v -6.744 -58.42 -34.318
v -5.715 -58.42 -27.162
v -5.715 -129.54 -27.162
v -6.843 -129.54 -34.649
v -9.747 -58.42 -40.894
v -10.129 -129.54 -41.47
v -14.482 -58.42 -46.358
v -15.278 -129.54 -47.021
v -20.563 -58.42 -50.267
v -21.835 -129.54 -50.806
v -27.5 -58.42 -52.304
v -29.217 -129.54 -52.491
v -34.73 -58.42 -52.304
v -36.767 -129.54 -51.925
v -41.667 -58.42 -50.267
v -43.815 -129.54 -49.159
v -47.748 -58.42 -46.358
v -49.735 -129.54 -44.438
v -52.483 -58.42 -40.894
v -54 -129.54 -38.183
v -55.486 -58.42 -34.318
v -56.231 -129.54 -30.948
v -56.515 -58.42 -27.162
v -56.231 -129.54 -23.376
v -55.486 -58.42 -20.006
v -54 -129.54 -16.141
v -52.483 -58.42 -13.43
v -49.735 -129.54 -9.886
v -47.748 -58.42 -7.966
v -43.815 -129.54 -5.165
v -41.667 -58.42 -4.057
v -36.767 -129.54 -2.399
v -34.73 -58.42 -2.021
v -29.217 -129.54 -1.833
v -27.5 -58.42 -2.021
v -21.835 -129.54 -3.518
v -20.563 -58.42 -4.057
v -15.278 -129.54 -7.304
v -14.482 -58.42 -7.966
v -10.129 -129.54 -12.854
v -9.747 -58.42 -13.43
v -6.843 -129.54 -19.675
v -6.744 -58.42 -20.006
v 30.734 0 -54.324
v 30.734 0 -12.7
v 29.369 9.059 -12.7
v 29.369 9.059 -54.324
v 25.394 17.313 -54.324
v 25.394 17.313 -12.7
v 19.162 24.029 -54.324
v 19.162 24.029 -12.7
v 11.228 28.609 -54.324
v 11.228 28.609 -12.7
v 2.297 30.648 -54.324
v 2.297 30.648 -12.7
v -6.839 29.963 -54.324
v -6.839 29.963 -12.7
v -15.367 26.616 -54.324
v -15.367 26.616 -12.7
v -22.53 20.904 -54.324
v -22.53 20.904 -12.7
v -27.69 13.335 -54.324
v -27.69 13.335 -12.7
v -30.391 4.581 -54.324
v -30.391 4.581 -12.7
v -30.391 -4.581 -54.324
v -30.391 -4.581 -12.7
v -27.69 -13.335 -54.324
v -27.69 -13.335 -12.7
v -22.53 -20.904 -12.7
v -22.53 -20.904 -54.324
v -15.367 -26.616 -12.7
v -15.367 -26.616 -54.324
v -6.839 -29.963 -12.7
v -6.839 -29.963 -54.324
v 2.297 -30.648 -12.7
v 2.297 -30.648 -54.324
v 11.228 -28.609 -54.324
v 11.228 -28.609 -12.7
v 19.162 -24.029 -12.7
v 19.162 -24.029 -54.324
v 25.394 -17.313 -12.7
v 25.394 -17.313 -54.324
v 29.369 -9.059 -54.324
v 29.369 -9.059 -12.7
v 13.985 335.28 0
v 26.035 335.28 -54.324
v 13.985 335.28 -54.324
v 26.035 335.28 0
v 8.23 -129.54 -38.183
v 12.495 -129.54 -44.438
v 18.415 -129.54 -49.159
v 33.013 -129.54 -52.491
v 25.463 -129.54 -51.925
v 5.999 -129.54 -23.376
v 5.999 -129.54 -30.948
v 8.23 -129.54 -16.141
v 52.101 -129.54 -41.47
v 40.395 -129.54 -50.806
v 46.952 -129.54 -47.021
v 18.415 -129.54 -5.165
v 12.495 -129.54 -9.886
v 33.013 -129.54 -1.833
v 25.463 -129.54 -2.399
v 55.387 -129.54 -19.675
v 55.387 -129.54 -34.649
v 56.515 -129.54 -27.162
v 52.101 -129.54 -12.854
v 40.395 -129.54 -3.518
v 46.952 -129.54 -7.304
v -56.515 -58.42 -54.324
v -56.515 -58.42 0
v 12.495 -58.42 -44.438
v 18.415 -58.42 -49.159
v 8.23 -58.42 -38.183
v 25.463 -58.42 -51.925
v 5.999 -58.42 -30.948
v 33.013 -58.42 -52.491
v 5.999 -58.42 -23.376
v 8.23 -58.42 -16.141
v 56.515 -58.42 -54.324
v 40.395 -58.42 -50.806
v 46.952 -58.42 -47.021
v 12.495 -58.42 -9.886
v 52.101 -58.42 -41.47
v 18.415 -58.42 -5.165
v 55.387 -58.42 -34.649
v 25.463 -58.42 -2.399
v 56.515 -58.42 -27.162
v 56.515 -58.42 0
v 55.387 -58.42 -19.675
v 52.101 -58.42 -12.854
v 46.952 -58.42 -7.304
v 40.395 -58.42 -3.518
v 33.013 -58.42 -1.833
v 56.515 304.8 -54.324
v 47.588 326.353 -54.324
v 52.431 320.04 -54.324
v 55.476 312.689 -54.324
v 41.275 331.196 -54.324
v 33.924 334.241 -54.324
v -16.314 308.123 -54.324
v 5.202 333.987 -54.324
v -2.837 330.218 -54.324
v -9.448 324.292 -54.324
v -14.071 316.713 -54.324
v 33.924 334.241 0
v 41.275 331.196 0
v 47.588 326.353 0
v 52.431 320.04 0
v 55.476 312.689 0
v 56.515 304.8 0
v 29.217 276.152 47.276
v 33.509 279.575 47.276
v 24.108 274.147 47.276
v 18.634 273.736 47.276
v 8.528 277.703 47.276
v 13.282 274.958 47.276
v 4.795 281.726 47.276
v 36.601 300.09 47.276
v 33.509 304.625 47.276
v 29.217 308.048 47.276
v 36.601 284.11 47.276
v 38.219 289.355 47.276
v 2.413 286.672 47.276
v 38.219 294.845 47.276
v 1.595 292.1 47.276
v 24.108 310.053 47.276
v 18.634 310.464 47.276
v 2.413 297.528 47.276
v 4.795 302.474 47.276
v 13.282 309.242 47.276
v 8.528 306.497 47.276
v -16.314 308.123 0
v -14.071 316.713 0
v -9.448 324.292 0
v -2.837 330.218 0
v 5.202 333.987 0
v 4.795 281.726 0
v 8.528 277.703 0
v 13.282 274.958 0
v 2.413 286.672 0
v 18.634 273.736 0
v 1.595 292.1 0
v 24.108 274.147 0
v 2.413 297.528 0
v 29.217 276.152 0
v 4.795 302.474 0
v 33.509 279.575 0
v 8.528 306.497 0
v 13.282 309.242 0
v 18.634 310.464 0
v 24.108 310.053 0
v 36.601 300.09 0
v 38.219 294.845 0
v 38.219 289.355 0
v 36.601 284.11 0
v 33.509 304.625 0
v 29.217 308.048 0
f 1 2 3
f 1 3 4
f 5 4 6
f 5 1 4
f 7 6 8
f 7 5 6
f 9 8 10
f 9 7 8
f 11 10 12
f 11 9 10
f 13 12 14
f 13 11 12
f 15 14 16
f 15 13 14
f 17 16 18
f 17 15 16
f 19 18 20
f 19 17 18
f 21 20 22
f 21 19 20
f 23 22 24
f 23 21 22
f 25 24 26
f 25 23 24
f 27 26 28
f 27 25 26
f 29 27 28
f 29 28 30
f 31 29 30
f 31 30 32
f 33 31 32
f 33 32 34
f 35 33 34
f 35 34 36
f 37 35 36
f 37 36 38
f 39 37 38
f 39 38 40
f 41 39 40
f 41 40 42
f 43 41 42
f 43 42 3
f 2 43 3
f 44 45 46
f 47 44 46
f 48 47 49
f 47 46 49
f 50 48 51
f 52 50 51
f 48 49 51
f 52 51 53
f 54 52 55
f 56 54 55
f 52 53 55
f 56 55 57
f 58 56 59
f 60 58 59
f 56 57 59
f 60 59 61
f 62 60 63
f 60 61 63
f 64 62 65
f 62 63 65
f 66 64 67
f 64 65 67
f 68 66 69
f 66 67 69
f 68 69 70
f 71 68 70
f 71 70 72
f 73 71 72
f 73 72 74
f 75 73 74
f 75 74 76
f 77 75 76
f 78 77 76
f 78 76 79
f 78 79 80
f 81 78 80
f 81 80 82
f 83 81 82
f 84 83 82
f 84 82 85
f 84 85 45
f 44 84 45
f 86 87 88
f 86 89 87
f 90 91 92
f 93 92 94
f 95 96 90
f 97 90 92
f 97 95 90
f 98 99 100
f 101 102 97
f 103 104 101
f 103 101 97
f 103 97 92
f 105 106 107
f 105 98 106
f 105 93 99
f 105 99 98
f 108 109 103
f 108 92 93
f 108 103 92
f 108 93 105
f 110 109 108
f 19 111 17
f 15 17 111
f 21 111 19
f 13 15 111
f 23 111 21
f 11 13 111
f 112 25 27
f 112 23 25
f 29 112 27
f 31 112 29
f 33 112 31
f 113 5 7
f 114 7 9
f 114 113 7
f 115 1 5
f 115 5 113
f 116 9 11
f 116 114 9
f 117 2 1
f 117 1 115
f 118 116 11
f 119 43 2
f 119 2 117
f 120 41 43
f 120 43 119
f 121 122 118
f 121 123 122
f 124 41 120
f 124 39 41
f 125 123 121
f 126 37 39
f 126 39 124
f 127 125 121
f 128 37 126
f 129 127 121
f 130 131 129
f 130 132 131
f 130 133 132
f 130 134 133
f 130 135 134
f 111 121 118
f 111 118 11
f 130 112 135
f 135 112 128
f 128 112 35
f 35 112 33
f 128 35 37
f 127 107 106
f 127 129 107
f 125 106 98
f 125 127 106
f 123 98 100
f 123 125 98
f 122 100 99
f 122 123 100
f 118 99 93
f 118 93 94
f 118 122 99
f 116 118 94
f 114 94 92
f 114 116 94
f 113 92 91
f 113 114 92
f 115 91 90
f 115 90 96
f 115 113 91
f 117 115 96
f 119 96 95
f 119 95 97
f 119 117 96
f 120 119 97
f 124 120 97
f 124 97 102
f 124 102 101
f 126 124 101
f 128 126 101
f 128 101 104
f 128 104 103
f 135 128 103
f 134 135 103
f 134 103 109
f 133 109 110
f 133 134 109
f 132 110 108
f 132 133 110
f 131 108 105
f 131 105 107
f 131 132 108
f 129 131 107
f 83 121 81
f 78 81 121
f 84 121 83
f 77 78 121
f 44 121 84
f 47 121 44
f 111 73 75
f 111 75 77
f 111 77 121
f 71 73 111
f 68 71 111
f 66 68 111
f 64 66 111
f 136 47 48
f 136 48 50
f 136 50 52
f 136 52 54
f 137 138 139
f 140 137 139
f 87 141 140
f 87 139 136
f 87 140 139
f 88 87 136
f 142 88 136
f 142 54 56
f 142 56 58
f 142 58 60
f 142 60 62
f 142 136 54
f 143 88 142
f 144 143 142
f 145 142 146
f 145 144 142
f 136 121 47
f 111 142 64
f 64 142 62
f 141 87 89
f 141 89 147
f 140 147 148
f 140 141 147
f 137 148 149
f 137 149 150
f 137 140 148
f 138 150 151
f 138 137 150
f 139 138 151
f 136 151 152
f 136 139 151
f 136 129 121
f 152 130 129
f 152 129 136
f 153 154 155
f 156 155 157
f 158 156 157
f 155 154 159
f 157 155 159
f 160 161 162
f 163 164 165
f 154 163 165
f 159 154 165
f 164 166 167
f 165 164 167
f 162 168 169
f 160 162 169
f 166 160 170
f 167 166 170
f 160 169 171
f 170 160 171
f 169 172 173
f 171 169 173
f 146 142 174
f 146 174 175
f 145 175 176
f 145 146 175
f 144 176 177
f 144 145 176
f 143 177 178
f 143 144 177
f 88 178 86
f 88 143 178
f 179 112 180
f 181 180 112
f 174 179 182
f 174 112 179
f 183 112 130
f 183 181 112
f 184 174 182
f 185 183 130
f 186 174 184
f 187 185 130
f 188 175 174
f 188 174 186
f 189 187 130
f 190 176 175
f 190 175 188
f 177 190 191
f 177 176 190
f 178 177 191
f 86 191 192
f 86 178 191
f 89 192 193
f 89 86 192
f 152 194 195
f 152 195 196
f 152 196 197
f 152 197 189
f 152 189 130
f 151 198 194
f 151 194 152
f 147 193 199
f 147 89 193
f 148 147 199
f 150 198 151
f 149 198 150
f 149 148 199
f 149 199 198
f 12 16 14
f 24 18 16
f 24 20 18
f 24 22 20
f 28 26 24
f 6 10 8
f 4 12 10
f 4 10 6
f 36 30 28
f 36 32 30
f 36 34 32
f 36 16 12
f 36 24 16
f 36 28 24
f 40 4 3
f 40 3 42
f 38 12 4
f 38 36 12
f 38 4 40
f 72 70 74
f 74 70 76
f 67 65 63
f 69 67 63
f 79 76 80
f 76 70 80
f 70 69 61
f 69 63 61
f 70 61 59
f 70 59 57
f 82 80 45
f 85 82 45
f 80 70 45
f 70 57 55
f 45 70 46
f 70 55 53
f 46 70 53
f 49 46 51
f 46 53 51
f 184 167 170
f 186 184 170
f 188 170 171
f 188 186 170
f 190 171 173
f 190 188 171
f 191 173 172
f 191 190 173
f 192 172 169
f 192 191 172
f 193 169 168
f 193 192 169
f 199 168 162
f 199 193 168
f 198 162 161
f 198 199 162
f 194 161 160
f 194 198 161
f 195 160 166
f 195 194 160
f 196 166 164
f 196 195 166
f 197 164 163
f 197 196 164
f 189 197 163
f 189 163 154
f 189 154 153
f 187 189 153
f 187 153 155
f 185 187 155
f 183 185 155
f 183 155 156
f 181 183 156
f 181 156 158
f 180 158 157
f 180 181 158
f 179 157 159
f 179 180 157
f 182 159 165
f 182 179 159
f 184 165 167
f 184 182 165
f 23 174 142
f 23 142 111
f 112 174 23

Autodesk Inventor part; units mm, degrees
ref_plane "YZ Plane" through (0, 0, 0) normal (1, 0, 0) x (0, 1, 0)
ref_plane "XZ Plane" through (0, 0, 0) normal (0, 1, 0) x (-1, 0, 0)
ref_plane "XY Plane" through (0, 0, 0) normal (0, 0, 1) x (1, 0, 0)
sketch "Sketch1" plane through (0, 0, 0) normal (0, 0, 1) x (1, 0, 0)
  circle A0 centre (0, 0) radius 30.734
  line L0 (-56.515, -58.42) -> (56.515, -58.42)
  line L1 (56.515, -58.42) -> (56.515, 335.28)
  line L2 (56.515, 335.28) -> (-13.335, 335.28)
  line L3 (-13.335, 335.28) -> (-56.515, -58.42)
  dimension "d0" = 61.468
  dimension "d1" = 393.7
  dimension "d2" = 113.03
  dimension "d3" = 69.85
  dimension "d4" = 58.42
  dimension "d5" = 56.515
extrude "Extrusion1" add sketch "Sketch1" against normal blind 54.3243
fillet "Fillet1" radius 30.48 2 edges at (56.515, 335.28, -27.1621) (-13.335, 335.28, -27.1621)
sketch "Sketch2" plane through (-56.515, -58.42, 0) normal (0, -1, 0) x (1, 0, 0)
  line L0 (113.03, 0) -> (113.03, -54.3243) projected
  line L1 (113.03, -27.1621) -> (0, -27.1621)
  line L2 (0, 0) -> (0, -54.3243) projected
  line L3 (56.515, -27.1621) -> (56.515, -44.3071)
  circle A0 centre (87.63, -27.1621) radius 25.4
  circle A1 centre (25.4, -27.1621) radius 25.4
  point P0 (56.515, 0)
  dimension "d10" = 50.8
  dimension "d9" = 50.8
  dimension "d11" = 113.03
extrude "Extrusion2" add sketch "Sketch2" along normal blind 71.12
sketch "Sketch3" plane through (0, 0, 0) normal (0, 0, 1) x (1, 0, 0)
  circle A0 centre (0, 0) radius 42.7153
extrude "Extrusion3" add sketch "Sketch3" against normal blind 12.7
sketch "Sketch4" plane through (0, 0, -54.3243) normal (0, 0, -1) x (-1, 0, 0)
  line L0 (-26.035, 335.28) -> (-13.9848, 335.28) projected
  line L1 (-20.0099, 335.28) -> (-20.0099, 292.1)
  circle A0 centre (-20.0099, 292.1) radius 18.415
  point P0 (0, 0)
  dimension "d17" = 36.83
  dimension "d20" = 292.1
extrude "Extrusion4" add sketch "Sketch4" against normal blind 101.6
equation "\"d5\" = 0.5 * d2"
equation "\"d10\" = d9"
properties part number "Forearm-lrg"
